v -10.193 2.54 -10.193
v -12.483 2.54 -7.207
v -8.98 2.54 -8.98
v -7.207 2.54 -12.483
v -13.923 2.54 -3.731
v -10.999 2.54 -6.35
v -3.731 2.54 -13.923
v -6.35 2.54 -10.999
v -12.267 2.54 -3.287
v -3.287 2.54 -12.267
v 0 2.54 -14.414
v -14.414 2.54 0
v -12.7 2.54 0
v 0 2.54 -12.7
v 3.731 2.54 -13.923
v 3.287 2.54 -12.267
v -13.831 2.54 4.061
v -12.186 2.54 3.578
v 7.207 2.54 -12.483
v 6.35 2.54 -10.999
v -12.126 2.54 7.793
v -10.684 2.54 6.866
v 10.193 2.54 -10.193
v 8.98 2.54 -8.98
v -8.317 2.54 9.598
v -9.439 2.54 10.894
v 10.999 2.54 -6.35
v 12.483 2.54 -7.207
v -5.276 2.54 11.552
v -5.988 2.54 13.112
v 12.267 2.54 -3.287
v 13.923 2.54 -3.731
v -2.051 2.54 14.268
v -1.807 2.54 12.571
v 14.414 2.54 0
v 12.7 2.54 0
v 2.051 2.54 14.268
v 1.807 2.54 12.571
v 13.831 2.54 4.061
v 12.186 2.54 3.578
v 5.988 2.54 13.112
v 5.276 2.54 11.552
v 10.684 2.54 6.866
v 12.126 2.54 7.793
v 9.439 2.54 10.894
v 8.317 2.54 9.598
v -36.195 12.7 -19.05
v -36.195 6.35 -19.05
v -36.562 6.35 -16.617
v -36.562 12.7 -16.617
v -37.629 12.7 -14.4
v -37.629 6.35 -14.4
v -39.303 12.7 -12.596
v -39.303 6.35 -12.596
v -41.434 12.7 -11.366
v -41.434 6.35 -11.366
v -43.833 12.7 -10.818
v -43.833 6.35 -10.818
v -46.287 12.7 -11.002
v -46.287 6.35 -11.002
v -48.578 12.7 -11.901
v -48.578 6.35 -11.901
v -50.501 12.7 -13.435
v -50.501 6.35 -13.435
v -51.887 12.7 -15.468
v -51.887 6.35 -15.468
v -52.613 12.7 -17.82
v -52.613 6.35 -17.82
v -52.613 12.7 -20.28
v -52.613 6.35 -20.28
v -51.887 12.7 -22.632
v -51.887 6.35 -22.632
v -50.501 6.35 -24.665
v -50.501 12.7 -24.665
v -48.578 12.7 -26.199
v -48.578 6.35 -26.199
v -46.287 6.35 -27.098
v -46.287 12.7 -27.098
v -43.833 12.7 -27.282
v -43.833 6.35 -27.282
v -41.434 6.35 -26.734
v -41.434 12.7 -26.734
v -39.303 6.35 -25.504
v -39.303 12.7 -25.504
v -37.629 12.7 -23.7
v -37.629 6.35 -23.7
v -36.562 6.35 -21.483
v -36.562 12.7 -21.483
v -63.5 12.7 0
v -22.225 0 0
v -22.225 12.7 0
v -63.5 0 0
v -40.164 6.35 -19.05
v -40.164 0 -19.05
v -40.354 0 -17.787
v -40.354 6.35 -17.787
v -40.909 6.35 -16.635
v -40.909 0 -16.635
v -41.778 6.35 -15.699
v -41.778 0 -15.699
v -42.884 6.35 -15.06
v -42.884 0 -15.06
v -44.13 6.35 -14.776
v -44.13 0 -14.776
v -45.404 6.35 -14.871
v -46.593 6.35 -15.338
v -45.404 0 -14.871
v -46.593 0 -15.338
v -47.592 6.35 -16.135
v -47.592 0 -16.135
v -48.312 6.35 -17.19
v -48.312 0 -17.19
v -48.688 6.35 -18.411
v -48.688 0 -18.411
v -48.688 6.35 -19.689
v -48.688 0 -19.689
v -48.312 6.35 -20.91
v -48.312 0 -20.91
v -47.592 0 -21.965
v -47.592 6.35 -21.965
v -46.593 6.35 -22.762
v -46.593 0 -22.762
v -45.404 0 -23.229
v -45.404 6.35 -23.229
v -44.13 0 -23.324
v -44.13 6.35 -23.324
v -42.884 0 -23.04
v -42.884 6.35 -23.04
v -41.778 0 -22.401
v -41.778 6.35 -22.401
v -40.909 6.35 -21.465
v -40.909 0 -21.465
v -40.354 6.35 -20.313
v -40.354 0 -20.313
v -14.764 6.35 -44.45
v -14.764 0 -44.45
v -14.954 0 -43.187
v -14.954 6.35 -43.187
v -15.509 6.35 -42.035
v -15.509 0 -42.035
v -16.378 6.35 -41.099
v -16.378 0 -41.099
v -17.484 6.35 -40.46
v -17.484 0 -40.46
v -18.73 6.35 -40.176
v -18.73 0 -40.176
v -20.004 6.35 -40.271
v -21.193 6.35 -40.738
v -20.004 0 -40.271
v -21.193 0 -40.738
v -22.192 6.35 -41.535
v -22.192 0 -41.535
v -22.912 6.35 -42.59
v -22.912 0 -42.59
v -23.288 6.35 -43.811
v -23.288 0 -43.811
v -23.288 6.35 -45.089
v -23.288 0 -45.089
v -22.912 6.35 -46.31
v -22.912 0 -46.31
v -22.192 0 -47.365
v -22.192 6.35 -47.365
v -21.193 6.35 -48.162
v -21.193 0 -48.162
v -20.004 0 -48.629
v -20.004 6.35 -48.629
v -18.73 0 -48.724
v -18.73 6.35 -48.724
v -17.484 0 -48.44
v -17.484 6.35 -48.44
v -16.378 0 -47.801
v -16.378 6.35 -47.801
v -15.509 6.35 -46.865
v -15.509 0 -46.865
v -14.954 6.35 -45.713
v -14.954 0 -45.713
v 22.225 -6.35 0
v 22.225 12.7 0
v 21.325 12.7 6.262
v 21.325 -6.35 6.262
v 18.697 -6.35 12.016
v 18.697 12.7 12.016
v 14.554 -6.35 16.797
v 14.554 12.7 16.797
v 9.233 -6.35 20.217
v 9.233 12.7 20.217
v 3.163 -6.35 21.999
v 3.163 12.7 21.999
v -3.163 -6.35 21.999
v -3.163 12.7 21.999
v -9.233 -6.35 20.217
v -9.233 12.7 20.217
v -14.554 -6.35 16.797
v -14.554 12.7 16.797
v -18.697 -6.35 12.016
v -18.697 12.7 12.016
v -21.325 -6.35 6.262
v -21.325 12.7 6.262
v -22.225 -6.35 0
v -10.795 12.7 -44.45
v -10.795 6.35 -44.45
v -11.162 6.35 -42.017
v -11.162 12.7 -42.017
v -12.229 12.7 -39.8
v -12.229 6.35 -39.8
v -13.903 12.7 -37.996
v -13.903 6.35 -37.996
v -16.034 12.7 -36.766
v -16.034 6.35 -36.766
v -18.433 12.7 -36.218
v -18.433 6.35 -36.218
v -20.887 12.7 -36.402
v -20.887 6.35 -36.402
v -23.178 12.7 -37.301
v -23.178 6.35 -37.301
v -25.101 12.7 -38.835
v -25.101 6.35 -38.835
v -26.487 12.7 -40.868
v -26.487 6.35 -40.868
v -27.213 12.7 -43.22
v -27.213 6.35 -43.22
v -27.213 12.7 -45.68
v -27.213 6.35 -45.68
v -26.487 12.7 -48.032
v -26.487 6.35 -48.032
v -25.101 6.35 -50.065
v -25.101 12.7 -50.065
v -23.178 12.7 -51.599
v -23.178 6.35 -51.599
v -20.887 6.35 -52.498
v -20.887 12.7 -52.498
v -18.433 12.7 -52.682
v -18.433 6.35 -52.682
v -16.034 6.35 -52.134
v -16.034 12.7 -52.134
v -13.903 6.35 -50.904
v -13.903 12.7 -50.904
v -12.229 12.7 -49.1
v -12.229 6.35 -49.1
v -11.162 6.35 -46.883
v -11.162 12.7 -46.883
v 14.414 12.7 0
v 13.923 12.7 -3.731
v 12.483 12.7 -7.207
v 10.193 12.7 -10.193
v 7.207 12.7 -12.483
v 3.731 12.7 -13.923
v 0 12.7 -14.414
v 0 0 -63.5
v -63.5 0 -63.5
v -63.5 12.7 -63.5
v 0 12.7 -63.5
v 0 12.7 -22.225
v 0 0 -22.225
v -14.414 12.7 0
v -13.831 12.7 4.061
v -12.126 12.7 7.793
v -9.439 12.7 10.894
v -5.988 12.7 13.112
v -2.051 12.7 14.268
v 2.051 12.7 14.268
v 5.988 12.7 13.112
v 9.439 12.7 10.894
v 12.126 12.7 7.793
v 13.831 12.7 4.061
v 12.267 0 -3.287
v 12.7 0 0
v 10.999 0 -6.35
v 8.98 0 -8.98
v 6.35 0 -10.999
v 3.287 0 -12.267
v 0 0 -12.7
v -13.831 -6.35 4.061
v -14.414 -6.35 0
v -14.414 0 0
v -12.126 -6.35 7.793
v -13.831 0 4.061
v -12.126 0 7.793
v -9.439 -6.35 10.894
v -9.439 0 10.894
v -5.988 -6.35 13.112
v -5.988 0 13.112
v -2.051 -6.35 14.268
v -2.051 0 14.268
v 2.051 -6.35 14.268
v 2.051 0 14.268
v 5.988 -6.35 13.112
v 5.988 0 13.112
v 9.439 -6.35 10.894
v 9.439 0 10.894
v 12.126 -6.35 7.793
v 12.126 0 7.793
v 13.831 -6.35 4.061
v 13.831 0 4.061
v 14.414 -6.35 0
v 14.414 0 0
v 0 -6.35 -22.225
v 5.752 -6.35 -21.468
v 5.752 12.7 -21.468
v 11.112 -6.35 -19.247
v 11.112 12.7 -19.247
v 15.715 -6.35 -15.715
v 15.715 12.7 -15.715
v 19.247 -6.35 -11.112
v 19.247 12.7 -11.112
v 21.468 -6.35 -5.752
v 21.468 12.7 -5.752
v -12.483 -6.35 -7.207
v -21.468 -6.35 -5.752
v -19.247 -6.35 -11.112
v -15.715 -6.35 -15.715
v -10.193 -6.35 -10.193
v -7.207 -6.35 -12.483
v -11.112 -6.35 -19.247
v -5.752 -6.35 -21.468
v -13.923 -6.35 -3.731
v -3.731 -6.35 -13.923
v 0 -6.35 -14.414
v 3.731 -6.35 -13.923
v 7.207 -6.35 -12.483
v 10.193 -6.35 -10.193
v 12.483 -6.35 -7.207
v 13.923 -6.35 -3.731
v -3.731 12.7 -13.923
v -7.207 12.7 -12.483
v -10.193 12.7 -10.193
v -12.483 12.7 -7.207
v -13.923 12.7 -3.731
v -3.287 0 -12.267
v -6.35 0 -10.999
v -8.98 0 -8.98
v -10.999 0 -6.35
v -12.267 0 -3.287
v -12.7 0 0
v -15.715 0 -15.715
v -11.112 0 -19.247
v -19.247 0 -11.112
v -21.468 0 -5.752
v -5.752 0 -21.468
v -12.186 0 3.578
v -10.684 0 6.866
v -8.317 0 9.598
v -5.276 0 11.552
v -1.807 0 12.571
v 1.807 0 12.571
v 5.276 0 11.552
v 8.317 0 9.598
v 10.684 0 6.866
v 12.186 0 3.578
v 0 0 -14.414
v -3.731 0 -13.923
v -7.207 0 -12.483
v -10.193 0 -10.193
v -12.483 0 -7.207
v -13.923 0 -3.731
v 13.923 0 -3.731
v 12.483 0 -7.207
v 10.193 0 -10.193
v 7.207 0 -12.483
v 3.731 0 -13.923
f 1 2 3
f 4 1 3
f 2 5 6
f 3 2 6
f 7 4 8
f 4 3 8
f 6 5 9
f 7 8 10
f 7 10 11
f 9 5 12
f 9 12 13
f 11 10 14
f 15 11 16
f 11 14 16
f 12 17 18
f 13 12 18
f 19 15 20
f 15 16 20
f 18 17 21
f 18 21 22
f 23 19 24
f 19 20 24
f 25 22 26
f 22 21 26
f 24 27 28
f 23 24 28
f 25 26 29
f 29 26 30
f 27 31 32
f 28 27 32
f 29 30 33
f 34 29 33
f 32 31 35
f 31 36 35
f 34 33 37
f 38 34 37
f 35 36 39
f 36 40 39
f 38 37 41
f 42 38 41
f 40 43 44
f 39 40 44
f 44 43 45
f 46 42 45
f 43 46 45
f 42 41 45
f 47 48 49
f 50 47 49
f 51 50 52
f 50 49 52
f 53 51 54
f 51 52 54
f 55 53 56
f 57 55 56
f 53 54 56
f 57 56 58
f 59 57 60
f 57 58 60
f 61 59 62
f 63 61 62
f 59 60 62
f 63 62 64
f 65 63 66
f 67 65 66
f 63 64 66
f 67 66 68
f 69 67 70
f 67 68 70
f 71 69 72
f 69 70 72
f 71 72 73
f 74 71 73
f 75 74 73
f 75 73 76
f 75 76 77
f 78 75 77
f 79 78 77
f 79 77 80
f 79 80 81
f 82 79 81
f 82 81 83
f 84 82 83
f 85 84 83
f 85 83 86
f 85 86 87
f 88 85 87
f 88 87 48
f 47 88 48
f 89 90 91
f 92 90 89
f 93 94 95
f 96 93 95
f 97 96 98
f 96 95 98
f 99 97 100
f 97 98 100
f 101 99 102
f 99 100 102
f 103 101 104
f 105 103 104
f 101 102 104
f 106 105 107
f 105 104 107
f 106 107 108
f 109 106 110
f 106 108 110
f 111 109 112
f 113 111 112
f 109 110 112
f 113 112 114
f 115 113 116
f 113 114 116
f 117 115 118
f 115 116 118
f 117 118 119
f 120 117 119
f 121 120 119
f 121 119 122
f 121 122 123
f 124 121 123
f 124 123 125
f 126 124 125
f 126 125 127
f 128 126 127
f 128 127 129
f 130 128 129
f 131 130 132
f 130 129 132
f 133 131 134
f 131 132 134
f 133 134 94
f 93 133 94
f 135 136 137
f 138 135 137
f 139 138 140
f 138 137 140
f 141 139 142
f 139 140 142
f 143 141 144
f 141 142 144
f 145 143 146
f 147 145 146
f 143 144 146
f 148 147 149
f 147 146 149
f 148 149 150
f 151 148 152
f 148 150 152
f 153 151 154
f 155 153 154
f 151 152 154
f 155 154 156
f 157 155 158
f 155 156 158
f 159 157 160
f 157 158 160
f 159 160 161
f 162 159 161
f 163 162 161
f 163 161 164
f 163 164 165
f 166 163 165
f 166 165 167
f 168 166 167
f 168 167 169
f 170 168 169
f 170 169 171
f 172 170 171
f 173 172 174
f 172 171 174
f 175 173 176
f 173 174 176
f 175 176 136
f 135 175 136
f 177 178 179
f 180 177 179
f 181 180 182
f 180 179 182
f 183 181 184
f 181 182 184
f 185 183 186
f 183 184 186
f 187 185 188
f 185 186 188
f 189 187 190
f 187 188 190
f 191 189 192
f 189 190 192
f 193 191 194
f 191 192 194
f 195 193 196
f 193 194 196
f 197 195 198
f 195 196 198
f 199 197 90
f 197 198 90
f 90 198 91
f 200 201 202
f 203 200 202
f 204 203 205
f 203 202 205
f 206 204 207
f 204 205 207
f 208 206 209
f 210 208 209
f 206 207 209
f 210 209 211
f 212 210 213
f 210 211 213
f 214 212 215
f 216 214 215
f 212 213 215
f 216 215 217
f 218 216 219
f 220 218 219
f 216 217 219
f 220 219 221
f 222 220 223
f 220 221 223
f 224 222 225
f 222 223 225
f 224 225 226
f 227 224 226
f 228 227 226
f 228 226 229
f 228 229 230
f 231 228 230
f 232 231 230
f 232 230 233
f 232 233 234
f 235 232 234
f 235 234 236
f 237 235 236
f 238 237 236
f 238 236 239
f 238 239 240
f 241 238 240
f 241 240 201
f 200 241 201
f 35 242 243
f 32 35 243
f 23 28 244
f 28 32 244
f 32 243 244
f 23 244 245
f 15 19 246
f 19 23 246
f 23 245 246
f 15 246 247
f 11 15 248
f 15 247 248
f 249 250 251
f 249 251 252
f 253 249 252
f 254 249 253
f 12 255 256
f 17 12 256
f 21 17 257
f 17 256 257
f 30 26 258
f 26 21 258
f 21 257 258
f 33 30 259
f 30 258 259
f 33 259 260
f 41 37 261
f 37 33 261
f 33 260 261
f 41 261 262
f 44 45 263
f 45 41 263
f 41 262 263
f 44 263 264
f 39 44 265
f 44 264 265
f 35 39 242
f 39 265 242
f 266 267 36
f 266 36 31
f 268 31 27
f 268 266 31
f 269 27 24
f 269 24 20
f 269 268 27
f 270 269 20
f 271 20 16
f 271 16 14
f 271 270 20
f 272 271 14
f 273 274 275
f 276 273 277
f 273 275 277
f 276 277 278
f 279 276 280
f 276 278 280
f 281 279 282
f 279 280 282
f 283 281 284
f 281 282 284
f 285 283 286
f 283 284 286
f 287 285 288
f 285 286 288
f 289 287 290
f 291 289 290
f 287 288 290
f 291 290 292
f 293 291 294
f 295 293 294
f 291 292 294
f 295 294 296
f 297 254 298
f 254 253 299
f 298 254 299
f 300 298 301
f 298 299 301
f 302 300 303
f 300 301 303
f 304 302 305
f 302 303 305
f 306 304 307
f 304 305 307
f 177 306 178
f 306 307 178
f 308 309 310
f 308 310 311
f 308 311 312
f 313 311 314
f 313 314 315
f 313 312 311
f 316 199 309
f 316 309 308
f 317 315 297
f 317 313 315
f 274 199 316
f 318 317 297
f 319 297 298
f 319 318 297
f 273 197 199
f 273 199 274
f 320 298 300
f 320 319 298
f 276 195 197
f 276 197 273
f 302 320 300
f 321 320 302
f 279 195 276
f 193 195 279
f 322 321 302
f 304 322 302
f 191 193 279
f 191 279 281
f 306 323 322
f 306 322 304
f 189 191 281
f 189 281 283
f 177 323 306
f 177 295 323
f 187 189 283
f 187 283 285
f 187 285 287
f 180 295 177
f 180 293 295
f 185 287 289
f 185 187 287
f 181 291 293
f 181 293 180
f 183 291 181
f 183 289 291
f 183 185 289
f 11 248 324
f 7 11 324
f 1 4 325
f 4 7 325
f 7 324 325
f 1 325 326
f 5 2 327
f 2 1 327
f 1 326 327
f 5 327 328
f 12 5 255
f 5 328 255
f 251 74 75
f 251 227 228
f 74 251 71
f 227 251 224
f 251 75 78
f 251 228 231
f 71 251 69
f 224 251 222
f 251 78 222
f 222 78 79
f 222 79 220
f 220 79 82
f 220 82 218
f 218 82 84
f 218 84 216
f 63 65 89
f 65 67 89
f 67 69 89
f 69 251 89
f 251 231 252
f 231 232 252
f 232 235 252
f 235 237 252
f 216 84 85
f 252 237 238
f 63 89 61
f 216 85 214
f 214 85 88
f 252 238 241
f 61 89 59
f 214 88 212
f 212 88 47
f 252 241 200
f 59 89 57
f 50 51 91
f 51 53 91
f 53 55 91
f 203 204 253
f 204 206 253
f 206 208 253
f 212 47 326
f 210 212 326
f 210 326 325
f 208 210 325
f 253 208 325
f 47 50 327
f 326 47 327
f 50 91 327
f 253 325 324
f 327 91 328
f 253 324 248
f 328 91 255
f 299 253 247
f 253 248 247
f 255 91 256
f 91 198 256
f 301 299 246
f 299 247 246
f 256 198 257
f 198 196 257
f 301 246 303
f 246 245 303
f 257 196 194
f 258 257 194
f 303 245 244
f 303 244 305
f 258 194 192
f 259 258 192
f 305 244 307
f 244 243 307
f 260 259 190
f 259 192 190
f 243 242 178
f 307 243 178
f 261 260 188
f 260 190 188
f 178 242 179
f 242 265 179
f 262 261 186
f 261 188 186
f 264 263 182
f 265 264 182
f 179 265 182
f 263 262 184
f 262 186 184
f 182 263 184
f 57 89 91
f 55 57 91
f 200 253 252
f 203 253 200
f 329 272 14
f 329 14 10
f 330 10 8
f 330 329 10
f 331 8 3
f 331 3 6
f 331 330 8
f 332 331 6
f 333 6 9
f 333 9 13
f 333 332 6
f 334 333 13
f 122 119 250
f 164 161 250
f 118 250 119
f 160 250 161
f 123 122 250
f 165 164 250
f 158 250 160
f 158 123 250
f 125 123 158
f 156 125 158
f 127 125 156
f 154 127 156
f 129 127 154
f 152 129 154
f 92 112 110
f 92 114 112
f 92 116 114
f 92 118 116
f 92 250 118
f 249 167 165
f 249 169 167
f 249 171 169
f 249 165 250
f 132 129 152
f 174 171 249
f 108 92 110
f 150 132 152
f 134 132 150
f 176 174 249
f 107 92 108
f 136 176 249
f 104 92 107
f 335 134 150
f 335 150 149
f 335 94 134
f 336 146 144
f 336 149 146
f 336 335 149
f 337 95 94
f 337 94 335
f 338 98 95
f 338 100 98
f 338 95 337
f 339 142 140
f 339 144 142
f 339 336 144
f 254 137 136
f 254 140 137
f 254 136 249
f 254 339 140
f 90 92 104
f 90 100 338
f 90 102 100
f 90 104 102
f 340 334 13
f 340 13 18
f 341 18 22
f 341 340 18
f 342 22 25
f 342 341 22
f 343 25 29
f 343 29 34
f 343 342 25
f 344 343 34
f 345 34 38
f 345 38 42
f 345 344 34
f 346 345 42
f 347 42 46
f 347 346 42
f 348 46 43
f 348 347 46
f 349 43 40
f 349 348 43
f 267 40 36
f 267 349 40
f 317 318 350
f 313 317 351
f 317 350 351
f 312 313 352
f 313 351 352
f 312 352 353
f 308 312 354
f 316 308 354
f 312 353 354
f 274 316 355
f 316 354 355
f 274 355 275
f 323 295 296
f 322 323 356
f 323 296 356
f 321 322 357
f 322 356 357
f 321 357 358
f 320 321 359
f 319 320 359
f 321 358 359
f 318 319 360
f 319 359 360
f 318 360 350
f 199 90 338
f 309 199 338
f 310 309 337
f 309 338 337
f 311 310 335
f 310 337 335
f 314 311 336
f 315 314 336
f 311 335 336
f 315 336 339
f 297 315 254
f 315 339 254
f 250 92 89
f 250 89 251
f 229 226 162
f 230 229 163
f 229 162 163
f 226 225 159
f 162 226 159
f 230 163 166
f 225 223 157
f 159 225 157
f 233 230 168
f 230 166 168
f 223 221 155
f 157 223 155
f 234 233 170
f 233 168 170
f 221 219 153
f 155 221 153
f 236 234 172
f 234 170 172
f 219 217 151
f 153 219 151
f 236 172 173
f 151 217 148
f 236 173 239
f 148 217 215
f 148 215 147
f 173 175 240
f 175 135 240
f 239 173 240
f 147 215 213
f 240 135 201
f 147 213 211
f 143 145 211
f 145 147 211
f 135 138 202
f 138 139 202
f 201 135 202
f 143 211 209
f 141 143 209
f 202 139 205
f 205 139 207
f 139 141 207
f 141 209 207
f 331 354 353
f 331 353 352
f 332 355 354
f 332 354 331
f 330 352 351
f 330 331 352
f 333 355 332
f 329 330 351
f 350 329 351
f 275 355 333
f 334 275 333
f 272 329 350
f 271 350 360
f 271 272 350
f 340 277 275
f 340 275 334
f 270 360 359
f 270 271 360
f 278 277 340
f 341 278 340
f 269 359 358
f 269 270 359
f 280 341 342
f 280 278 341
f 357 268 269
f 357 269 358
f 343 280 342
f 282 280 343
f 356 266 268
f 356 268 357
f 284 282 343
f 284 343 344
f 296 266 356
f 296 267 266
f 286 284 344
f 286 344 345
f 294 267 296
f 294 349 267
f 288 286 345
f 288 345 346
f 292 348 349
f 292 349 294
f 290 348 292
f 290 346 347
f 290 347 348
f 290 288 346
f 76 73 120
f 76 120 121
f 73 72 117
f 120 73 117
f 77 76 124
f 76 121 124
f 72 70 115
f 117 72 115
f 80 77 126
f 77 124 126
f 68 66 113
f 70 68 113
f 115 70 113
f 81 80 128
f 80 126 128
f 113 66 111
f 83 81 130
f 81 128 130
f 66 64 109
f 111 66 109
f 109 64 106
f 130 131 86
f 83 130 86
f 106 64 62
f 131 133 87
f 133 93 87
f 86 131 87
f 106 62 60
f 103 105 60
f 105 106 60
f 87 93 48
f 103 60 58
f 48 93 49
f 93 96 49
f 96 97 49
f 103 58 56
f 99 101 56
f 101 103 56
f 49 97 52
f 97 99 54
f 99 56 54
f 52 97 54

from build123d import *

# Parameters (mm, degrees)
F0_R          = 8.255
F1_DEPTH      = 12.7
F0_R_2        = 4.28625
F2_DEPTH      = 6.35
F3_DEPTH      = 12.7
F3_DEPTH_BACK = 6.35
F4_DEPTH      = 2.54


with BuildPart() as f1:
    # F0 (on Front) → F1 (new body)
    with BuildSketch(Plane.XZ):
        with BuildLine():
            ThreePointArc((0, -22.225), (-15.715448, -15.715448), (-22.225, 0))
            Line((-22.225, 0), (-63.5, 0))
            Line((-63.5, 0), (-63.5, -63.5))
            Line((-63.5, -63.5), (0, -63.5))
            Line((0, -63.5), (0, -22.225))
        make_face()
        with Locations((-19.05, -44.45)):
            Circle(F0_R, mode=Mode.SUBTRACT)
        with Locations((-44.45, -19.05)):
            Circle(F0_R, mode=Mode.SUBTRACT)
    extrude(amount=F1_DEPTH)

    # F0 (on Front) → F2 (join)
    with BuildSketch(Plane.XZ):
        with Locations((-44.45, -19.05)):
            Circle(F0_R)
        with Locations((-44.45, -19.05)):
            Circle(F0_R_2, mode=Mode.SUBTRACT)
        with Locations((-19.05, -44.45)):
            Circle(F0_R)
        with Locations((-19.05, -44.45)):
            Circle(F0_R_2, mode=Mode.SUBTRACT)
    extrude(amount=F2_DEPTH)

    # F0 (on Front) → F3 (join, two sides)
    with BuildSketch(Plane.XZ) as f3_sk:
        with BuildLine():
            ThreePointArc((-14.4145, 0), (0, 14.4145), (14.4145, 0))
            ThreePointArc((14.4145, 0), (10.192591, -10.192591), (0, -14.4145))
            Line((0, -14.4145), (0, -22.225))
            ThreePointArc((0, -22.225), (15.715448, -15.715448), (22.225, 0))
            ThreePointArc((22.225, 0), (0, 22.225), (-22.225, 0))
            Line((-22.225, 0), (-14.4145, 0))
        make_face()
        with BuildLine():
            ThreePointArc((0, -14.4145), (-10.192591, -10.192591), (-14.4145, 0))
            Line((-14.4145, 0), (-22.225, 0))
            ThreePointArc((-22.225, 0), (-15.715448, -15.715448), (0, -22.225))
            Line((0, -22.225), (0, -14.4145))
        make_face()
    extrude(amount=F3_DEPTH)
    extrude(f3_sk.sketch, amount=-F3_DEPTH_BACK)

    # F0 (on Front) → F4 (join)
    with BuildSketch(Plane.XZ):
        with BuildLine():
            ThreePointArc((0, -14.4145), (10.192591, -10.192591), (14.4145, 0))
            ThreePointArc((14.4145, 0), (0, 14.4145), (-14.4145, 0))
            Line((-14.4145, 0), (-12.7, 0))
            ThreePointArc((-12.7, 0), (0, 12.7), (12.7, 0))
            ThreePointArc((12.7, 0), (8.980256, -8.980256), (0, -12.7))
            Line((0, -12.7), (0, -14.4145))
        make_face()
        with BuildLine():
            Line((-12.7, 0), (-14.4145, 0))
            ThreePointArc((-14.4145, 0), (-10.192591, -10.192591), (0, -14.4145))
            Line((0, -14.4145), (0, -12.7))
            ThreePointArc((0, -12.7), (-8.980256, -8.980256), (-12.7, 0))
        make_face()
    extrude(amount=F4_DEPTH)


with BuildPart() as f5_1:
    # F5: instance of F1
    add(f1.part.mirror(Plane.XZ))


solid = f5_1.part
